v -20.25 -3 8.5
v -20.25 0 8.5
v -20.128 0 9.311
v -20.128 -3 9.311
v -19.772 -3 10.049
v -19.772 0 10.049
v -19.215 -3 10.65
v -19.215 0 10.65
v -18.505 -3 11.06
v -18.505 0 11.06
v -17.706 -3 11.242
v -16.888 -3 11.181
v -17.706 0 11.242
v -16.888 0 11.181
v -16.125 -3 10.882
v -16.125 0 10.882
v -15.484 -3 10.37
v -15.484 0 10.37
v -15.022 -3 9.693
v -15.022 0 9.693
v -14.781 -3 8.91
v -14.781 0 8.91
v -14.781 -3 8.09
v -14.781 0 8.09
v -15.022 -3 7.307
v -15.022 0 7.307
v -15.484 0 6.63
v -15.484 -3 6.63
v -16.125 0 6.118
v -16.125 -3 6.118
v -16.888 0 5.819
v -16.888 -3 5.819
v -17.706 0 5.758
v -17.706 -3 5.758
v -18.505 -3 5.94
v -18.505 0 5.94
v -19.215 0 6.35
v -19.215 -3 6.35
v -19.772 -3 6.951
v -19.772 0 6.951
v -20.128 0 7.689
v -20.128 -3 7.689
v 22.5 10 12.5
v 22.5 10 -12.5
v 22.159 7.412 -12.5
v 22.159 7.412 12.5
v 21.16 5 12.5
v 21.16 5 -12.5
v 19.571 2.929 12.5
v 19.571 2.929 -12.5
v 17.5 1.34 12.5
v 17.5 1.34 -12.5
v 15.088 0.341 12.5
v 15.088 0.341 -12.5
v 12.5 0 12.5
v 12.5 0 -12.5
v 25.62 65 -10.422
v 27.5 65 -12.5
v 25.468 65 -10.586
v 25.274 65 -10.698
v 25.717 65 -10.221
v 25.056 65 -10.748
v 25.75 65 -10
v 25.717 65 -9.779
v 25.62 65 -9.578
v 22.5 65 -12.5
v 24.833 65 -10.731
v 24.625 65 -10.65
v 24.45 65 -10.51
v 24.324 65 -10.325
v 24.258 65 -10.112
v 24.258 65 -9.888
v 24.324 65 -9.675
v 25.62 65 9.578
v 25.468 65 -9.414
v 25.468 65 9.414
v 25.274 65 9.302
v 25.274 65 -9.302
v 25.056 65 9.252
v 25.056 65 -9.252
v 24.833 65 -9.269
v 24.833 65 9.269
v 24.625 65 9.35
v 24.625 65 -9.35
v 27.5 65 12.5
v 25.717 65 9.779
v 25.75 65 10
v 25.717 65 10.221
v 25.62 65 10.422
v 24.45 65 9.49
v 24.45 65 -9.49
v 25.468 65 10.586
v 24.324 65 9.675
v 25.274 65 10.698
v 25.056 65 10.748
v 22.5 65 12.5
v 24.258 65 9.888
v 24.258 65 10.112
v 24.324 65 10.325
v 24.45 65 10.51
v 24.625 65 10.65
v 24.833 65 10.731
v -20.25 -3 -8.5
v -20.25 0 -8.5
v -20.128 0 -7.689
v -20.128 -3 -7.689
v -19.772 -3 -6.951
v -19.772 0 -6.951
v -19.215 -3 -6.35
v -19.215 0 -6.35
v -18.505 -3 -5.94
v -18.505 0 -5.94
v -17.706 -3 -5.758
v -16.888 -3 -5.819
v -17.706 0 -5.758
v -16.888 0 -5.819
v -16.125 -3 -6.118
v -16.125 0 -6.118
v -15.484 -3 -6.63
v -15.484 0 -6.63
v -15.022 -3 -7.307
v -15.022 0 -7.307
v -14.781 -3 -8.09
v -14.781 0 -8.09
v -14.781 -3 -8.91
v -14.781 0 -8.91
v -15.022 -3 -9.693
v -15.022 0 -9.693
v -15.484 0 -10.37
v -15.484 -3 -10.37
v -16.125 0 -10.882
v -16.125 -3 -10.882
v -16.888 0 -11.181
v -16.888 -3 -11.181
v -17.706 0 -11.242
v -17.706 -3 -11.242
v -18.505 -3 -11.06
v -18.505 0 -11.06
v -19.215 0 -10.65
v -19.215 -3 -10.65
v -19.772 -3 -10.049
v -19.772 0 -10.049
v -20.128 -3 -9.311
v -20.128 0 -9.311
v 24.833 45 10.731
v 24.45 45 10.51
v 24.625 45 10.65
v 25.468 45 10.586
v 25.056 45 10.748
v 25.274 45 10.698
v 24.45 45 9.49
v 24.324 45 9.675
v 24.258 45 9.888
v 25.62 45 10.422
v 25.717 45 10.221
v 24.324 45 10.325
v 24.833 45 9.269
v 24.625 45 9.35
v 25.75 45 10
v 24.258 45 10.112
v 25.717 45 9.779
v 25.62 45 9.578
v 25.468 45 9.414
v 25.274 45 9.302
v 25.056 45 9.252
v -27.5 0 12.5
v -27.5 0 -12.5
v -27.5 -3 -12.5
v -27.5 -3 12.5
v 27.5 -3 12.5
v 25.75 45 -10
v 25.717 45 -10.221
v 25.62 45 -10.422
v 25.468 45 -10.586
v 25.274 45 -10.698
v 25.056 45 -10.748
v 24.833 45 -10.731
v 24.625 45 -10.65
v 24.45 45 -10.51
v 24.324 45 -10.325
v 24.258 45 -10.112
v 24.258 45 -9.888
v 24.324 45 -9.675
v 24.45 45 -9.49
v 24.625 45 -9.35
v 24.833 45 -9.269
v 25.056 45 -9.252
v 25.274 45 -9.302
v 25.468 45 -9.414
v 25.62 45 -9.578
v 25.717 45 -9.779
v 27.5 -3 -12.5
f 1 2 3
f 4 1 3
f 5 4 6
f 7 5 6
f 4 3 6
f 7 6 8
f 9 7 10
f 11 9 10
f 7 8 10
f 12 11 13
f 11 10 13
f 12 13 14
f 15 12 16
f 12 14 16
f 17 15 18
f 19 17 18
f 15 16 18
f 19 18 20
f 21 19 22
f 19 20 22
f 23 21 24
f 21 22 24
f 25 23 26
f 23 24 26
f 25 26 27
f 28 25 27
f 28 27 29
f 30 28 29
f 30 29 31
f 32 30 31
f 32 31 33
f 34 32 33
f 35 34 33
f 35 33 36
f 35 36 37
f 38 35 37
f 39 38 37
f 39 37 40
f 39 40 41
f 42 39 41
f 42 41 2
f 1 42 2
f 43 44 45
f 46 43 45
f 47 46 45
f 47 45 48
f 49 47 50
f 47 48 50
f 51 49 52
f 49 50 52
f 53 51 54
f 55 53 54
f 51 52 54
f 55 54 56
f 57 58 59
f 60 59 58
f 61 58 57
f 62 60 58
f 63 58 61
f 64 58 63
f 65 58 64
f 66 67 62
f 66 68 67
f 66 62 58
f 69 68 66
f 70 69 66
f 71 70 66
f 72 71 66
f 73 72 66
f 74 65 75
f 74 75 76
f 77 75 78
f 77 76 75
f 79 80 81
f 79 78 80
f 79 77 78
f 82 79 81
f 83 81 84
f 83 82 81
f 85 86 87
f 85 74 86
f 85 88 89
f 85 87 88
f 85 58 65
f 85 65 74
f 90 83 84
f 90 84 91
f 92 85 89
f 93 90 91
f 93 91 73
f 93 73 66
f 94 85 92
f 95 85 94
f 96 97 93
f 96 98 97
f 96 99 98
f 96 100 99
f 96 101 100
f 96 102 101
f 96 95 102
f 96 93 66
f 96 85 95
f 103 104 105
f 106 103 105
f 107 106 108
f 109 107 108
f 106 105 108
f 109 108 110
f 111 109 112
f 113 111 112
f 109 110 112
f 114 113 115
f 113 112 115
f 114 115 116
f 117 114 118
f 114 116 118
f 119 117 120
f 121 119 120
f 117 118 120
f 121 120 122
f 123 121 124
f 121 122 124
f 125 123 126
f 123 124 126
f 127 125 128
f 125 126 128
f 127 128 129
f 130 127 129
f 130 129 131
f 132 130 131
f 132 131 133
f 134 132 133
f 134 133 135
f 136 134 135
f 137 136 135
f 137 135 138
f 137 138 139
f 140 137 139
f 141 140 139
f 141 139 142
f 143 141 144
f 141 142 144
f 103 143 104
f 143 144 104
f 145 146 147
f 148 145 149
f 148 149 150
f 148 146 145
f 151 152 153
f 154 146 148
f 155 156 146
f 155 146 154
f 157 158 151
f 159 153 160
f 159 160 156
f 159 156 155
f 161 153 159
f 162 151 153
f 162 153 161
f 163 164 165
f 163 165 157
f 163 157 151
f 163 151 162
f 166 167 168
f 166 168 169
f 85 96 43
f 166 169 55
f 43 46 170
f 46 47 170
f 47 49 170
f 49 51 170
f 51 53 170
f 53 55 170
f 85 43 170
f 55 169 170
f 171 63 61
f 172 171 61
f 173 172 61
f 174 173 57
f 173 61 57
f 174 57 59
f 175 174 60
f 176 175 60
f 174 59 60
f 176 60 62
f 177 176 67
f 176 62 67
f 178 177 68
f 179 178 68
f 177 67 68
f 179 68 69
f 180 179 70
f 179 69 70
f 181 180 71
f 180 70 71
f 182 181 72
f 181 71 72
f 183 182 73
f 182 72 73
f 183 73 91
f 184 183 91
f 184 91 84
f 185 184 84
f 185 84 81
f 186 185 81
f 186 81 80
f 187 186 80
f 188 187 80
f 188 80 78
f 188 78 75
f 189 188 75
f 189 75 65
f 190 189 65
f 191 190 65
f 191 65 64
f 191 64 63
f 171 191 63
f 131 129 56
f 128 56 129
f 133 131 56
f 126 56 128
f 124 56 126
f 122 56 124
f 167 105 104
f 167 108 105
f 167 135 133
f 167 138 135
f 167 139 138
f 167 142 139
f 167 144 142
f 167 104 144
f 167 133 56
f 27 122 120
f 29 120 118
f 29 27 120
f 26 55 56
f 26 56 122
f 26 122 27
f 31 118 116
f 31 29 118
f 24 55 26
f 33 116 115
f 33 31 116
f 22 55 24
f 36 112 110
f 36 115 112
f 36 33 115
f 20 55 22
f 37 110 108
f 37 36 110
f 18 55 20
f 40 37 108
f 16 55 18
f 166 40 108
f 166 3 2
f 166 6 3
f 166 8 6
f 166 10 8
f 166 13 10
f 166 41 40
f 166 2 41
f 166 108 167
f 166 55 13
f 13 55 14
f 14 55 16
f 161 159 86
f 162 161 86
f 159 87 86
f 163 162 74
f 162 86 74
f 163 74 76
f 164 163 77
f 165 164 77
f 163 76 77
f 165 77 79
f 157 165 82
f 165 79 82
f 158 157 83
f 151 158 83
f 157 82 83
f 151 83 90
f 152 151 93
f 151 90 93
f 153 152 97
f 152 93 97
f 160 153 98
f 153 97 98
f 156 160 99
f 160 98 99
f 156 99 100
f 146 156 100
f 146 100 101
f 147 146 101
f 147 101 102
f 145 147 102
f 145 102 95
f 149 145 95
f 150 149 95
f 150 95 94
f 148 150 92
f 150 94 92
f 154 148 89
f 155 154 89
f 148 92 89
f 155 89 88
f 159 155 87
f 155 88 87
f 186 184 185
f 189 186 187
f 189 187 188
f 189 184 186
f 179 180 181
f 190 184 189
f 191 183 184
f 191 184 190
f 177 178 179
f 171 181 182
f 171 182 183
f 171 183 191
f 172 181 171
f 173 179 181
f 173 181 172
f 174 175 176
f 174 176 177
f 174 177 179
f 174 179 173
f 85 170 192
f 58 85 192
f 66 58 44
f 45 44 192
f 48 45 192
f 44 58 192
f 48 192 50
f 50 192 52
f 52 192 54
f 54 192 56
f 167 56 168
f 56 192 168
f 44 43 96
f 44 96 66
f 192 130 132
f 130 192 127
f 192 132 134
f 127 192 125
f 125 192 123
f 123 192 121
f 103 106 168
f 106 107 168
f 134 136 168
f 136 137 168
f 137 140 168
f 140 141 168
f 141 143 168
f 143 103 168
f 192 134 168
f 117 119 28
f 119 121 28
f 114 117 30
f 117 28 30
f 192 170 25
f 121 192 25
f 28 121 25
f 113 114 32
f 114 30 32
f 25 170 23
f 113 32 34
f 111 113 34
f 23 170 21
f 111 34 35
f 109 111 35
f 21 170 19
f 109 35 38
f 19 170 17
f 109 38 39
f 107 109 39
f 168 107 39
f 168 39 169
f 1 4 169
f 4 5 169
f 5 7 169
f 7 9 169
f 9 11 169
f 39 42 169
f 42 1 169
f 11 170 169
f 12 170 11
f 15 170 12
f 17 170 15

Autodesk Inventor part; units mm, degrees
ref_plane "YZ Plane" through (0, 0, 0) normal (1, 0, 0) x (0, 1, 0)
ref_plane "XZ Plane" through (0, 0, 0) normal (0, 1, 0) x (-1, 0, 0)
ref_plane "XY Plane" through (0, 0, 0) normal (0, 0, 1) x (1, 0, 0)
sketch "Sketch1" plane through (0, 0, 0) normal (0, 1, 0) x (-1, 0, 0)
  line L0 (27.5, 12.5) -> (-27.5, 12.5)
  line L1 (-27.5, 12.5) -> (-27.5, -12.5)
  line L2 (-27.5, -12.5) -> (27.5, -12.5)
  line L3 (27.5, -12.5) -> (27.5, 12.5)
  line L4 (27.5, 12.5) -> (-27.5, -12.5) construction
  line L5 (-27.5, 12.5) -> (27.5, -12.5) construction
  line L6 (27.5, 0) -> (17.5, 0) construction
  line L7 (17.5, 12.5) -> (17.5, 8.5) construction
  line L8 (17.5, -12.5) -> (17.5, -8.5) construction
  circle A0 centre (17.5, 8.5) radius 2.75
  circle A1 centre (17.5, -8.5) radius 2.75
  line L9 (-27.5, 12.5) -> (-22.5, 12.5) construction
  line L10 (-22.5, 12.5) -> (-22.5, -12.5)
  point P0 (0, 0)
  dimension "d0" = 55
  dimension "d1" = 25
  dimension "d2" = 10
  dimension "d3" = 4
  dimension "d4" = 4
  dimension "d5" = 5.5
  dimension "d6" = 5.5
  dimension "d7" = 5
extrude "Extrusion1" add sketch "Sketch1" against normal blind 3 contours L3 L2 L10 L0
extrude "Extrusion2" add sketch "Sketch1" against normal blind 3 contours L10 L2 L1 L0
extrude "Extrusion3" add sketch "Sketch1" along normal blind 65 contours L10 L2 L1 L0
sketch "Sketch2" plane through (0, 65, 0) normal (0, 1, 0) x (1, 0, 0)
  line L0 (27.5, -12.5) -> (-27.5, -12.5) construction
  line L1 (27.5, -12.5) -> (25, -12.5) construction
  line L2 (25, -12.5) -> (25, -10) construction
  line L3 (27.5, 12.5) -> (22.5, 12.5) construction
  line L4 (25, 12.5) -> (25, 10) construction
  circle A0 centre (25, -10) radius 0.75
  circle A1 centre (25, 10) radius 0.75
  point P0 (0, 0)
  dimension "d14" = 2.5
  dimension "d15" = 2.5
  dimension "d16" = 2.5
  dimension "d17" = 1.5
  dimension "d18" = 1.5
extrude "Extrusion4" cut sketch "Sketch2" against normal blind 20
fillet "Fillet1" radius 10 1 edges at (22.5, 0, 0)
properties part number "Camera_Wiper"
